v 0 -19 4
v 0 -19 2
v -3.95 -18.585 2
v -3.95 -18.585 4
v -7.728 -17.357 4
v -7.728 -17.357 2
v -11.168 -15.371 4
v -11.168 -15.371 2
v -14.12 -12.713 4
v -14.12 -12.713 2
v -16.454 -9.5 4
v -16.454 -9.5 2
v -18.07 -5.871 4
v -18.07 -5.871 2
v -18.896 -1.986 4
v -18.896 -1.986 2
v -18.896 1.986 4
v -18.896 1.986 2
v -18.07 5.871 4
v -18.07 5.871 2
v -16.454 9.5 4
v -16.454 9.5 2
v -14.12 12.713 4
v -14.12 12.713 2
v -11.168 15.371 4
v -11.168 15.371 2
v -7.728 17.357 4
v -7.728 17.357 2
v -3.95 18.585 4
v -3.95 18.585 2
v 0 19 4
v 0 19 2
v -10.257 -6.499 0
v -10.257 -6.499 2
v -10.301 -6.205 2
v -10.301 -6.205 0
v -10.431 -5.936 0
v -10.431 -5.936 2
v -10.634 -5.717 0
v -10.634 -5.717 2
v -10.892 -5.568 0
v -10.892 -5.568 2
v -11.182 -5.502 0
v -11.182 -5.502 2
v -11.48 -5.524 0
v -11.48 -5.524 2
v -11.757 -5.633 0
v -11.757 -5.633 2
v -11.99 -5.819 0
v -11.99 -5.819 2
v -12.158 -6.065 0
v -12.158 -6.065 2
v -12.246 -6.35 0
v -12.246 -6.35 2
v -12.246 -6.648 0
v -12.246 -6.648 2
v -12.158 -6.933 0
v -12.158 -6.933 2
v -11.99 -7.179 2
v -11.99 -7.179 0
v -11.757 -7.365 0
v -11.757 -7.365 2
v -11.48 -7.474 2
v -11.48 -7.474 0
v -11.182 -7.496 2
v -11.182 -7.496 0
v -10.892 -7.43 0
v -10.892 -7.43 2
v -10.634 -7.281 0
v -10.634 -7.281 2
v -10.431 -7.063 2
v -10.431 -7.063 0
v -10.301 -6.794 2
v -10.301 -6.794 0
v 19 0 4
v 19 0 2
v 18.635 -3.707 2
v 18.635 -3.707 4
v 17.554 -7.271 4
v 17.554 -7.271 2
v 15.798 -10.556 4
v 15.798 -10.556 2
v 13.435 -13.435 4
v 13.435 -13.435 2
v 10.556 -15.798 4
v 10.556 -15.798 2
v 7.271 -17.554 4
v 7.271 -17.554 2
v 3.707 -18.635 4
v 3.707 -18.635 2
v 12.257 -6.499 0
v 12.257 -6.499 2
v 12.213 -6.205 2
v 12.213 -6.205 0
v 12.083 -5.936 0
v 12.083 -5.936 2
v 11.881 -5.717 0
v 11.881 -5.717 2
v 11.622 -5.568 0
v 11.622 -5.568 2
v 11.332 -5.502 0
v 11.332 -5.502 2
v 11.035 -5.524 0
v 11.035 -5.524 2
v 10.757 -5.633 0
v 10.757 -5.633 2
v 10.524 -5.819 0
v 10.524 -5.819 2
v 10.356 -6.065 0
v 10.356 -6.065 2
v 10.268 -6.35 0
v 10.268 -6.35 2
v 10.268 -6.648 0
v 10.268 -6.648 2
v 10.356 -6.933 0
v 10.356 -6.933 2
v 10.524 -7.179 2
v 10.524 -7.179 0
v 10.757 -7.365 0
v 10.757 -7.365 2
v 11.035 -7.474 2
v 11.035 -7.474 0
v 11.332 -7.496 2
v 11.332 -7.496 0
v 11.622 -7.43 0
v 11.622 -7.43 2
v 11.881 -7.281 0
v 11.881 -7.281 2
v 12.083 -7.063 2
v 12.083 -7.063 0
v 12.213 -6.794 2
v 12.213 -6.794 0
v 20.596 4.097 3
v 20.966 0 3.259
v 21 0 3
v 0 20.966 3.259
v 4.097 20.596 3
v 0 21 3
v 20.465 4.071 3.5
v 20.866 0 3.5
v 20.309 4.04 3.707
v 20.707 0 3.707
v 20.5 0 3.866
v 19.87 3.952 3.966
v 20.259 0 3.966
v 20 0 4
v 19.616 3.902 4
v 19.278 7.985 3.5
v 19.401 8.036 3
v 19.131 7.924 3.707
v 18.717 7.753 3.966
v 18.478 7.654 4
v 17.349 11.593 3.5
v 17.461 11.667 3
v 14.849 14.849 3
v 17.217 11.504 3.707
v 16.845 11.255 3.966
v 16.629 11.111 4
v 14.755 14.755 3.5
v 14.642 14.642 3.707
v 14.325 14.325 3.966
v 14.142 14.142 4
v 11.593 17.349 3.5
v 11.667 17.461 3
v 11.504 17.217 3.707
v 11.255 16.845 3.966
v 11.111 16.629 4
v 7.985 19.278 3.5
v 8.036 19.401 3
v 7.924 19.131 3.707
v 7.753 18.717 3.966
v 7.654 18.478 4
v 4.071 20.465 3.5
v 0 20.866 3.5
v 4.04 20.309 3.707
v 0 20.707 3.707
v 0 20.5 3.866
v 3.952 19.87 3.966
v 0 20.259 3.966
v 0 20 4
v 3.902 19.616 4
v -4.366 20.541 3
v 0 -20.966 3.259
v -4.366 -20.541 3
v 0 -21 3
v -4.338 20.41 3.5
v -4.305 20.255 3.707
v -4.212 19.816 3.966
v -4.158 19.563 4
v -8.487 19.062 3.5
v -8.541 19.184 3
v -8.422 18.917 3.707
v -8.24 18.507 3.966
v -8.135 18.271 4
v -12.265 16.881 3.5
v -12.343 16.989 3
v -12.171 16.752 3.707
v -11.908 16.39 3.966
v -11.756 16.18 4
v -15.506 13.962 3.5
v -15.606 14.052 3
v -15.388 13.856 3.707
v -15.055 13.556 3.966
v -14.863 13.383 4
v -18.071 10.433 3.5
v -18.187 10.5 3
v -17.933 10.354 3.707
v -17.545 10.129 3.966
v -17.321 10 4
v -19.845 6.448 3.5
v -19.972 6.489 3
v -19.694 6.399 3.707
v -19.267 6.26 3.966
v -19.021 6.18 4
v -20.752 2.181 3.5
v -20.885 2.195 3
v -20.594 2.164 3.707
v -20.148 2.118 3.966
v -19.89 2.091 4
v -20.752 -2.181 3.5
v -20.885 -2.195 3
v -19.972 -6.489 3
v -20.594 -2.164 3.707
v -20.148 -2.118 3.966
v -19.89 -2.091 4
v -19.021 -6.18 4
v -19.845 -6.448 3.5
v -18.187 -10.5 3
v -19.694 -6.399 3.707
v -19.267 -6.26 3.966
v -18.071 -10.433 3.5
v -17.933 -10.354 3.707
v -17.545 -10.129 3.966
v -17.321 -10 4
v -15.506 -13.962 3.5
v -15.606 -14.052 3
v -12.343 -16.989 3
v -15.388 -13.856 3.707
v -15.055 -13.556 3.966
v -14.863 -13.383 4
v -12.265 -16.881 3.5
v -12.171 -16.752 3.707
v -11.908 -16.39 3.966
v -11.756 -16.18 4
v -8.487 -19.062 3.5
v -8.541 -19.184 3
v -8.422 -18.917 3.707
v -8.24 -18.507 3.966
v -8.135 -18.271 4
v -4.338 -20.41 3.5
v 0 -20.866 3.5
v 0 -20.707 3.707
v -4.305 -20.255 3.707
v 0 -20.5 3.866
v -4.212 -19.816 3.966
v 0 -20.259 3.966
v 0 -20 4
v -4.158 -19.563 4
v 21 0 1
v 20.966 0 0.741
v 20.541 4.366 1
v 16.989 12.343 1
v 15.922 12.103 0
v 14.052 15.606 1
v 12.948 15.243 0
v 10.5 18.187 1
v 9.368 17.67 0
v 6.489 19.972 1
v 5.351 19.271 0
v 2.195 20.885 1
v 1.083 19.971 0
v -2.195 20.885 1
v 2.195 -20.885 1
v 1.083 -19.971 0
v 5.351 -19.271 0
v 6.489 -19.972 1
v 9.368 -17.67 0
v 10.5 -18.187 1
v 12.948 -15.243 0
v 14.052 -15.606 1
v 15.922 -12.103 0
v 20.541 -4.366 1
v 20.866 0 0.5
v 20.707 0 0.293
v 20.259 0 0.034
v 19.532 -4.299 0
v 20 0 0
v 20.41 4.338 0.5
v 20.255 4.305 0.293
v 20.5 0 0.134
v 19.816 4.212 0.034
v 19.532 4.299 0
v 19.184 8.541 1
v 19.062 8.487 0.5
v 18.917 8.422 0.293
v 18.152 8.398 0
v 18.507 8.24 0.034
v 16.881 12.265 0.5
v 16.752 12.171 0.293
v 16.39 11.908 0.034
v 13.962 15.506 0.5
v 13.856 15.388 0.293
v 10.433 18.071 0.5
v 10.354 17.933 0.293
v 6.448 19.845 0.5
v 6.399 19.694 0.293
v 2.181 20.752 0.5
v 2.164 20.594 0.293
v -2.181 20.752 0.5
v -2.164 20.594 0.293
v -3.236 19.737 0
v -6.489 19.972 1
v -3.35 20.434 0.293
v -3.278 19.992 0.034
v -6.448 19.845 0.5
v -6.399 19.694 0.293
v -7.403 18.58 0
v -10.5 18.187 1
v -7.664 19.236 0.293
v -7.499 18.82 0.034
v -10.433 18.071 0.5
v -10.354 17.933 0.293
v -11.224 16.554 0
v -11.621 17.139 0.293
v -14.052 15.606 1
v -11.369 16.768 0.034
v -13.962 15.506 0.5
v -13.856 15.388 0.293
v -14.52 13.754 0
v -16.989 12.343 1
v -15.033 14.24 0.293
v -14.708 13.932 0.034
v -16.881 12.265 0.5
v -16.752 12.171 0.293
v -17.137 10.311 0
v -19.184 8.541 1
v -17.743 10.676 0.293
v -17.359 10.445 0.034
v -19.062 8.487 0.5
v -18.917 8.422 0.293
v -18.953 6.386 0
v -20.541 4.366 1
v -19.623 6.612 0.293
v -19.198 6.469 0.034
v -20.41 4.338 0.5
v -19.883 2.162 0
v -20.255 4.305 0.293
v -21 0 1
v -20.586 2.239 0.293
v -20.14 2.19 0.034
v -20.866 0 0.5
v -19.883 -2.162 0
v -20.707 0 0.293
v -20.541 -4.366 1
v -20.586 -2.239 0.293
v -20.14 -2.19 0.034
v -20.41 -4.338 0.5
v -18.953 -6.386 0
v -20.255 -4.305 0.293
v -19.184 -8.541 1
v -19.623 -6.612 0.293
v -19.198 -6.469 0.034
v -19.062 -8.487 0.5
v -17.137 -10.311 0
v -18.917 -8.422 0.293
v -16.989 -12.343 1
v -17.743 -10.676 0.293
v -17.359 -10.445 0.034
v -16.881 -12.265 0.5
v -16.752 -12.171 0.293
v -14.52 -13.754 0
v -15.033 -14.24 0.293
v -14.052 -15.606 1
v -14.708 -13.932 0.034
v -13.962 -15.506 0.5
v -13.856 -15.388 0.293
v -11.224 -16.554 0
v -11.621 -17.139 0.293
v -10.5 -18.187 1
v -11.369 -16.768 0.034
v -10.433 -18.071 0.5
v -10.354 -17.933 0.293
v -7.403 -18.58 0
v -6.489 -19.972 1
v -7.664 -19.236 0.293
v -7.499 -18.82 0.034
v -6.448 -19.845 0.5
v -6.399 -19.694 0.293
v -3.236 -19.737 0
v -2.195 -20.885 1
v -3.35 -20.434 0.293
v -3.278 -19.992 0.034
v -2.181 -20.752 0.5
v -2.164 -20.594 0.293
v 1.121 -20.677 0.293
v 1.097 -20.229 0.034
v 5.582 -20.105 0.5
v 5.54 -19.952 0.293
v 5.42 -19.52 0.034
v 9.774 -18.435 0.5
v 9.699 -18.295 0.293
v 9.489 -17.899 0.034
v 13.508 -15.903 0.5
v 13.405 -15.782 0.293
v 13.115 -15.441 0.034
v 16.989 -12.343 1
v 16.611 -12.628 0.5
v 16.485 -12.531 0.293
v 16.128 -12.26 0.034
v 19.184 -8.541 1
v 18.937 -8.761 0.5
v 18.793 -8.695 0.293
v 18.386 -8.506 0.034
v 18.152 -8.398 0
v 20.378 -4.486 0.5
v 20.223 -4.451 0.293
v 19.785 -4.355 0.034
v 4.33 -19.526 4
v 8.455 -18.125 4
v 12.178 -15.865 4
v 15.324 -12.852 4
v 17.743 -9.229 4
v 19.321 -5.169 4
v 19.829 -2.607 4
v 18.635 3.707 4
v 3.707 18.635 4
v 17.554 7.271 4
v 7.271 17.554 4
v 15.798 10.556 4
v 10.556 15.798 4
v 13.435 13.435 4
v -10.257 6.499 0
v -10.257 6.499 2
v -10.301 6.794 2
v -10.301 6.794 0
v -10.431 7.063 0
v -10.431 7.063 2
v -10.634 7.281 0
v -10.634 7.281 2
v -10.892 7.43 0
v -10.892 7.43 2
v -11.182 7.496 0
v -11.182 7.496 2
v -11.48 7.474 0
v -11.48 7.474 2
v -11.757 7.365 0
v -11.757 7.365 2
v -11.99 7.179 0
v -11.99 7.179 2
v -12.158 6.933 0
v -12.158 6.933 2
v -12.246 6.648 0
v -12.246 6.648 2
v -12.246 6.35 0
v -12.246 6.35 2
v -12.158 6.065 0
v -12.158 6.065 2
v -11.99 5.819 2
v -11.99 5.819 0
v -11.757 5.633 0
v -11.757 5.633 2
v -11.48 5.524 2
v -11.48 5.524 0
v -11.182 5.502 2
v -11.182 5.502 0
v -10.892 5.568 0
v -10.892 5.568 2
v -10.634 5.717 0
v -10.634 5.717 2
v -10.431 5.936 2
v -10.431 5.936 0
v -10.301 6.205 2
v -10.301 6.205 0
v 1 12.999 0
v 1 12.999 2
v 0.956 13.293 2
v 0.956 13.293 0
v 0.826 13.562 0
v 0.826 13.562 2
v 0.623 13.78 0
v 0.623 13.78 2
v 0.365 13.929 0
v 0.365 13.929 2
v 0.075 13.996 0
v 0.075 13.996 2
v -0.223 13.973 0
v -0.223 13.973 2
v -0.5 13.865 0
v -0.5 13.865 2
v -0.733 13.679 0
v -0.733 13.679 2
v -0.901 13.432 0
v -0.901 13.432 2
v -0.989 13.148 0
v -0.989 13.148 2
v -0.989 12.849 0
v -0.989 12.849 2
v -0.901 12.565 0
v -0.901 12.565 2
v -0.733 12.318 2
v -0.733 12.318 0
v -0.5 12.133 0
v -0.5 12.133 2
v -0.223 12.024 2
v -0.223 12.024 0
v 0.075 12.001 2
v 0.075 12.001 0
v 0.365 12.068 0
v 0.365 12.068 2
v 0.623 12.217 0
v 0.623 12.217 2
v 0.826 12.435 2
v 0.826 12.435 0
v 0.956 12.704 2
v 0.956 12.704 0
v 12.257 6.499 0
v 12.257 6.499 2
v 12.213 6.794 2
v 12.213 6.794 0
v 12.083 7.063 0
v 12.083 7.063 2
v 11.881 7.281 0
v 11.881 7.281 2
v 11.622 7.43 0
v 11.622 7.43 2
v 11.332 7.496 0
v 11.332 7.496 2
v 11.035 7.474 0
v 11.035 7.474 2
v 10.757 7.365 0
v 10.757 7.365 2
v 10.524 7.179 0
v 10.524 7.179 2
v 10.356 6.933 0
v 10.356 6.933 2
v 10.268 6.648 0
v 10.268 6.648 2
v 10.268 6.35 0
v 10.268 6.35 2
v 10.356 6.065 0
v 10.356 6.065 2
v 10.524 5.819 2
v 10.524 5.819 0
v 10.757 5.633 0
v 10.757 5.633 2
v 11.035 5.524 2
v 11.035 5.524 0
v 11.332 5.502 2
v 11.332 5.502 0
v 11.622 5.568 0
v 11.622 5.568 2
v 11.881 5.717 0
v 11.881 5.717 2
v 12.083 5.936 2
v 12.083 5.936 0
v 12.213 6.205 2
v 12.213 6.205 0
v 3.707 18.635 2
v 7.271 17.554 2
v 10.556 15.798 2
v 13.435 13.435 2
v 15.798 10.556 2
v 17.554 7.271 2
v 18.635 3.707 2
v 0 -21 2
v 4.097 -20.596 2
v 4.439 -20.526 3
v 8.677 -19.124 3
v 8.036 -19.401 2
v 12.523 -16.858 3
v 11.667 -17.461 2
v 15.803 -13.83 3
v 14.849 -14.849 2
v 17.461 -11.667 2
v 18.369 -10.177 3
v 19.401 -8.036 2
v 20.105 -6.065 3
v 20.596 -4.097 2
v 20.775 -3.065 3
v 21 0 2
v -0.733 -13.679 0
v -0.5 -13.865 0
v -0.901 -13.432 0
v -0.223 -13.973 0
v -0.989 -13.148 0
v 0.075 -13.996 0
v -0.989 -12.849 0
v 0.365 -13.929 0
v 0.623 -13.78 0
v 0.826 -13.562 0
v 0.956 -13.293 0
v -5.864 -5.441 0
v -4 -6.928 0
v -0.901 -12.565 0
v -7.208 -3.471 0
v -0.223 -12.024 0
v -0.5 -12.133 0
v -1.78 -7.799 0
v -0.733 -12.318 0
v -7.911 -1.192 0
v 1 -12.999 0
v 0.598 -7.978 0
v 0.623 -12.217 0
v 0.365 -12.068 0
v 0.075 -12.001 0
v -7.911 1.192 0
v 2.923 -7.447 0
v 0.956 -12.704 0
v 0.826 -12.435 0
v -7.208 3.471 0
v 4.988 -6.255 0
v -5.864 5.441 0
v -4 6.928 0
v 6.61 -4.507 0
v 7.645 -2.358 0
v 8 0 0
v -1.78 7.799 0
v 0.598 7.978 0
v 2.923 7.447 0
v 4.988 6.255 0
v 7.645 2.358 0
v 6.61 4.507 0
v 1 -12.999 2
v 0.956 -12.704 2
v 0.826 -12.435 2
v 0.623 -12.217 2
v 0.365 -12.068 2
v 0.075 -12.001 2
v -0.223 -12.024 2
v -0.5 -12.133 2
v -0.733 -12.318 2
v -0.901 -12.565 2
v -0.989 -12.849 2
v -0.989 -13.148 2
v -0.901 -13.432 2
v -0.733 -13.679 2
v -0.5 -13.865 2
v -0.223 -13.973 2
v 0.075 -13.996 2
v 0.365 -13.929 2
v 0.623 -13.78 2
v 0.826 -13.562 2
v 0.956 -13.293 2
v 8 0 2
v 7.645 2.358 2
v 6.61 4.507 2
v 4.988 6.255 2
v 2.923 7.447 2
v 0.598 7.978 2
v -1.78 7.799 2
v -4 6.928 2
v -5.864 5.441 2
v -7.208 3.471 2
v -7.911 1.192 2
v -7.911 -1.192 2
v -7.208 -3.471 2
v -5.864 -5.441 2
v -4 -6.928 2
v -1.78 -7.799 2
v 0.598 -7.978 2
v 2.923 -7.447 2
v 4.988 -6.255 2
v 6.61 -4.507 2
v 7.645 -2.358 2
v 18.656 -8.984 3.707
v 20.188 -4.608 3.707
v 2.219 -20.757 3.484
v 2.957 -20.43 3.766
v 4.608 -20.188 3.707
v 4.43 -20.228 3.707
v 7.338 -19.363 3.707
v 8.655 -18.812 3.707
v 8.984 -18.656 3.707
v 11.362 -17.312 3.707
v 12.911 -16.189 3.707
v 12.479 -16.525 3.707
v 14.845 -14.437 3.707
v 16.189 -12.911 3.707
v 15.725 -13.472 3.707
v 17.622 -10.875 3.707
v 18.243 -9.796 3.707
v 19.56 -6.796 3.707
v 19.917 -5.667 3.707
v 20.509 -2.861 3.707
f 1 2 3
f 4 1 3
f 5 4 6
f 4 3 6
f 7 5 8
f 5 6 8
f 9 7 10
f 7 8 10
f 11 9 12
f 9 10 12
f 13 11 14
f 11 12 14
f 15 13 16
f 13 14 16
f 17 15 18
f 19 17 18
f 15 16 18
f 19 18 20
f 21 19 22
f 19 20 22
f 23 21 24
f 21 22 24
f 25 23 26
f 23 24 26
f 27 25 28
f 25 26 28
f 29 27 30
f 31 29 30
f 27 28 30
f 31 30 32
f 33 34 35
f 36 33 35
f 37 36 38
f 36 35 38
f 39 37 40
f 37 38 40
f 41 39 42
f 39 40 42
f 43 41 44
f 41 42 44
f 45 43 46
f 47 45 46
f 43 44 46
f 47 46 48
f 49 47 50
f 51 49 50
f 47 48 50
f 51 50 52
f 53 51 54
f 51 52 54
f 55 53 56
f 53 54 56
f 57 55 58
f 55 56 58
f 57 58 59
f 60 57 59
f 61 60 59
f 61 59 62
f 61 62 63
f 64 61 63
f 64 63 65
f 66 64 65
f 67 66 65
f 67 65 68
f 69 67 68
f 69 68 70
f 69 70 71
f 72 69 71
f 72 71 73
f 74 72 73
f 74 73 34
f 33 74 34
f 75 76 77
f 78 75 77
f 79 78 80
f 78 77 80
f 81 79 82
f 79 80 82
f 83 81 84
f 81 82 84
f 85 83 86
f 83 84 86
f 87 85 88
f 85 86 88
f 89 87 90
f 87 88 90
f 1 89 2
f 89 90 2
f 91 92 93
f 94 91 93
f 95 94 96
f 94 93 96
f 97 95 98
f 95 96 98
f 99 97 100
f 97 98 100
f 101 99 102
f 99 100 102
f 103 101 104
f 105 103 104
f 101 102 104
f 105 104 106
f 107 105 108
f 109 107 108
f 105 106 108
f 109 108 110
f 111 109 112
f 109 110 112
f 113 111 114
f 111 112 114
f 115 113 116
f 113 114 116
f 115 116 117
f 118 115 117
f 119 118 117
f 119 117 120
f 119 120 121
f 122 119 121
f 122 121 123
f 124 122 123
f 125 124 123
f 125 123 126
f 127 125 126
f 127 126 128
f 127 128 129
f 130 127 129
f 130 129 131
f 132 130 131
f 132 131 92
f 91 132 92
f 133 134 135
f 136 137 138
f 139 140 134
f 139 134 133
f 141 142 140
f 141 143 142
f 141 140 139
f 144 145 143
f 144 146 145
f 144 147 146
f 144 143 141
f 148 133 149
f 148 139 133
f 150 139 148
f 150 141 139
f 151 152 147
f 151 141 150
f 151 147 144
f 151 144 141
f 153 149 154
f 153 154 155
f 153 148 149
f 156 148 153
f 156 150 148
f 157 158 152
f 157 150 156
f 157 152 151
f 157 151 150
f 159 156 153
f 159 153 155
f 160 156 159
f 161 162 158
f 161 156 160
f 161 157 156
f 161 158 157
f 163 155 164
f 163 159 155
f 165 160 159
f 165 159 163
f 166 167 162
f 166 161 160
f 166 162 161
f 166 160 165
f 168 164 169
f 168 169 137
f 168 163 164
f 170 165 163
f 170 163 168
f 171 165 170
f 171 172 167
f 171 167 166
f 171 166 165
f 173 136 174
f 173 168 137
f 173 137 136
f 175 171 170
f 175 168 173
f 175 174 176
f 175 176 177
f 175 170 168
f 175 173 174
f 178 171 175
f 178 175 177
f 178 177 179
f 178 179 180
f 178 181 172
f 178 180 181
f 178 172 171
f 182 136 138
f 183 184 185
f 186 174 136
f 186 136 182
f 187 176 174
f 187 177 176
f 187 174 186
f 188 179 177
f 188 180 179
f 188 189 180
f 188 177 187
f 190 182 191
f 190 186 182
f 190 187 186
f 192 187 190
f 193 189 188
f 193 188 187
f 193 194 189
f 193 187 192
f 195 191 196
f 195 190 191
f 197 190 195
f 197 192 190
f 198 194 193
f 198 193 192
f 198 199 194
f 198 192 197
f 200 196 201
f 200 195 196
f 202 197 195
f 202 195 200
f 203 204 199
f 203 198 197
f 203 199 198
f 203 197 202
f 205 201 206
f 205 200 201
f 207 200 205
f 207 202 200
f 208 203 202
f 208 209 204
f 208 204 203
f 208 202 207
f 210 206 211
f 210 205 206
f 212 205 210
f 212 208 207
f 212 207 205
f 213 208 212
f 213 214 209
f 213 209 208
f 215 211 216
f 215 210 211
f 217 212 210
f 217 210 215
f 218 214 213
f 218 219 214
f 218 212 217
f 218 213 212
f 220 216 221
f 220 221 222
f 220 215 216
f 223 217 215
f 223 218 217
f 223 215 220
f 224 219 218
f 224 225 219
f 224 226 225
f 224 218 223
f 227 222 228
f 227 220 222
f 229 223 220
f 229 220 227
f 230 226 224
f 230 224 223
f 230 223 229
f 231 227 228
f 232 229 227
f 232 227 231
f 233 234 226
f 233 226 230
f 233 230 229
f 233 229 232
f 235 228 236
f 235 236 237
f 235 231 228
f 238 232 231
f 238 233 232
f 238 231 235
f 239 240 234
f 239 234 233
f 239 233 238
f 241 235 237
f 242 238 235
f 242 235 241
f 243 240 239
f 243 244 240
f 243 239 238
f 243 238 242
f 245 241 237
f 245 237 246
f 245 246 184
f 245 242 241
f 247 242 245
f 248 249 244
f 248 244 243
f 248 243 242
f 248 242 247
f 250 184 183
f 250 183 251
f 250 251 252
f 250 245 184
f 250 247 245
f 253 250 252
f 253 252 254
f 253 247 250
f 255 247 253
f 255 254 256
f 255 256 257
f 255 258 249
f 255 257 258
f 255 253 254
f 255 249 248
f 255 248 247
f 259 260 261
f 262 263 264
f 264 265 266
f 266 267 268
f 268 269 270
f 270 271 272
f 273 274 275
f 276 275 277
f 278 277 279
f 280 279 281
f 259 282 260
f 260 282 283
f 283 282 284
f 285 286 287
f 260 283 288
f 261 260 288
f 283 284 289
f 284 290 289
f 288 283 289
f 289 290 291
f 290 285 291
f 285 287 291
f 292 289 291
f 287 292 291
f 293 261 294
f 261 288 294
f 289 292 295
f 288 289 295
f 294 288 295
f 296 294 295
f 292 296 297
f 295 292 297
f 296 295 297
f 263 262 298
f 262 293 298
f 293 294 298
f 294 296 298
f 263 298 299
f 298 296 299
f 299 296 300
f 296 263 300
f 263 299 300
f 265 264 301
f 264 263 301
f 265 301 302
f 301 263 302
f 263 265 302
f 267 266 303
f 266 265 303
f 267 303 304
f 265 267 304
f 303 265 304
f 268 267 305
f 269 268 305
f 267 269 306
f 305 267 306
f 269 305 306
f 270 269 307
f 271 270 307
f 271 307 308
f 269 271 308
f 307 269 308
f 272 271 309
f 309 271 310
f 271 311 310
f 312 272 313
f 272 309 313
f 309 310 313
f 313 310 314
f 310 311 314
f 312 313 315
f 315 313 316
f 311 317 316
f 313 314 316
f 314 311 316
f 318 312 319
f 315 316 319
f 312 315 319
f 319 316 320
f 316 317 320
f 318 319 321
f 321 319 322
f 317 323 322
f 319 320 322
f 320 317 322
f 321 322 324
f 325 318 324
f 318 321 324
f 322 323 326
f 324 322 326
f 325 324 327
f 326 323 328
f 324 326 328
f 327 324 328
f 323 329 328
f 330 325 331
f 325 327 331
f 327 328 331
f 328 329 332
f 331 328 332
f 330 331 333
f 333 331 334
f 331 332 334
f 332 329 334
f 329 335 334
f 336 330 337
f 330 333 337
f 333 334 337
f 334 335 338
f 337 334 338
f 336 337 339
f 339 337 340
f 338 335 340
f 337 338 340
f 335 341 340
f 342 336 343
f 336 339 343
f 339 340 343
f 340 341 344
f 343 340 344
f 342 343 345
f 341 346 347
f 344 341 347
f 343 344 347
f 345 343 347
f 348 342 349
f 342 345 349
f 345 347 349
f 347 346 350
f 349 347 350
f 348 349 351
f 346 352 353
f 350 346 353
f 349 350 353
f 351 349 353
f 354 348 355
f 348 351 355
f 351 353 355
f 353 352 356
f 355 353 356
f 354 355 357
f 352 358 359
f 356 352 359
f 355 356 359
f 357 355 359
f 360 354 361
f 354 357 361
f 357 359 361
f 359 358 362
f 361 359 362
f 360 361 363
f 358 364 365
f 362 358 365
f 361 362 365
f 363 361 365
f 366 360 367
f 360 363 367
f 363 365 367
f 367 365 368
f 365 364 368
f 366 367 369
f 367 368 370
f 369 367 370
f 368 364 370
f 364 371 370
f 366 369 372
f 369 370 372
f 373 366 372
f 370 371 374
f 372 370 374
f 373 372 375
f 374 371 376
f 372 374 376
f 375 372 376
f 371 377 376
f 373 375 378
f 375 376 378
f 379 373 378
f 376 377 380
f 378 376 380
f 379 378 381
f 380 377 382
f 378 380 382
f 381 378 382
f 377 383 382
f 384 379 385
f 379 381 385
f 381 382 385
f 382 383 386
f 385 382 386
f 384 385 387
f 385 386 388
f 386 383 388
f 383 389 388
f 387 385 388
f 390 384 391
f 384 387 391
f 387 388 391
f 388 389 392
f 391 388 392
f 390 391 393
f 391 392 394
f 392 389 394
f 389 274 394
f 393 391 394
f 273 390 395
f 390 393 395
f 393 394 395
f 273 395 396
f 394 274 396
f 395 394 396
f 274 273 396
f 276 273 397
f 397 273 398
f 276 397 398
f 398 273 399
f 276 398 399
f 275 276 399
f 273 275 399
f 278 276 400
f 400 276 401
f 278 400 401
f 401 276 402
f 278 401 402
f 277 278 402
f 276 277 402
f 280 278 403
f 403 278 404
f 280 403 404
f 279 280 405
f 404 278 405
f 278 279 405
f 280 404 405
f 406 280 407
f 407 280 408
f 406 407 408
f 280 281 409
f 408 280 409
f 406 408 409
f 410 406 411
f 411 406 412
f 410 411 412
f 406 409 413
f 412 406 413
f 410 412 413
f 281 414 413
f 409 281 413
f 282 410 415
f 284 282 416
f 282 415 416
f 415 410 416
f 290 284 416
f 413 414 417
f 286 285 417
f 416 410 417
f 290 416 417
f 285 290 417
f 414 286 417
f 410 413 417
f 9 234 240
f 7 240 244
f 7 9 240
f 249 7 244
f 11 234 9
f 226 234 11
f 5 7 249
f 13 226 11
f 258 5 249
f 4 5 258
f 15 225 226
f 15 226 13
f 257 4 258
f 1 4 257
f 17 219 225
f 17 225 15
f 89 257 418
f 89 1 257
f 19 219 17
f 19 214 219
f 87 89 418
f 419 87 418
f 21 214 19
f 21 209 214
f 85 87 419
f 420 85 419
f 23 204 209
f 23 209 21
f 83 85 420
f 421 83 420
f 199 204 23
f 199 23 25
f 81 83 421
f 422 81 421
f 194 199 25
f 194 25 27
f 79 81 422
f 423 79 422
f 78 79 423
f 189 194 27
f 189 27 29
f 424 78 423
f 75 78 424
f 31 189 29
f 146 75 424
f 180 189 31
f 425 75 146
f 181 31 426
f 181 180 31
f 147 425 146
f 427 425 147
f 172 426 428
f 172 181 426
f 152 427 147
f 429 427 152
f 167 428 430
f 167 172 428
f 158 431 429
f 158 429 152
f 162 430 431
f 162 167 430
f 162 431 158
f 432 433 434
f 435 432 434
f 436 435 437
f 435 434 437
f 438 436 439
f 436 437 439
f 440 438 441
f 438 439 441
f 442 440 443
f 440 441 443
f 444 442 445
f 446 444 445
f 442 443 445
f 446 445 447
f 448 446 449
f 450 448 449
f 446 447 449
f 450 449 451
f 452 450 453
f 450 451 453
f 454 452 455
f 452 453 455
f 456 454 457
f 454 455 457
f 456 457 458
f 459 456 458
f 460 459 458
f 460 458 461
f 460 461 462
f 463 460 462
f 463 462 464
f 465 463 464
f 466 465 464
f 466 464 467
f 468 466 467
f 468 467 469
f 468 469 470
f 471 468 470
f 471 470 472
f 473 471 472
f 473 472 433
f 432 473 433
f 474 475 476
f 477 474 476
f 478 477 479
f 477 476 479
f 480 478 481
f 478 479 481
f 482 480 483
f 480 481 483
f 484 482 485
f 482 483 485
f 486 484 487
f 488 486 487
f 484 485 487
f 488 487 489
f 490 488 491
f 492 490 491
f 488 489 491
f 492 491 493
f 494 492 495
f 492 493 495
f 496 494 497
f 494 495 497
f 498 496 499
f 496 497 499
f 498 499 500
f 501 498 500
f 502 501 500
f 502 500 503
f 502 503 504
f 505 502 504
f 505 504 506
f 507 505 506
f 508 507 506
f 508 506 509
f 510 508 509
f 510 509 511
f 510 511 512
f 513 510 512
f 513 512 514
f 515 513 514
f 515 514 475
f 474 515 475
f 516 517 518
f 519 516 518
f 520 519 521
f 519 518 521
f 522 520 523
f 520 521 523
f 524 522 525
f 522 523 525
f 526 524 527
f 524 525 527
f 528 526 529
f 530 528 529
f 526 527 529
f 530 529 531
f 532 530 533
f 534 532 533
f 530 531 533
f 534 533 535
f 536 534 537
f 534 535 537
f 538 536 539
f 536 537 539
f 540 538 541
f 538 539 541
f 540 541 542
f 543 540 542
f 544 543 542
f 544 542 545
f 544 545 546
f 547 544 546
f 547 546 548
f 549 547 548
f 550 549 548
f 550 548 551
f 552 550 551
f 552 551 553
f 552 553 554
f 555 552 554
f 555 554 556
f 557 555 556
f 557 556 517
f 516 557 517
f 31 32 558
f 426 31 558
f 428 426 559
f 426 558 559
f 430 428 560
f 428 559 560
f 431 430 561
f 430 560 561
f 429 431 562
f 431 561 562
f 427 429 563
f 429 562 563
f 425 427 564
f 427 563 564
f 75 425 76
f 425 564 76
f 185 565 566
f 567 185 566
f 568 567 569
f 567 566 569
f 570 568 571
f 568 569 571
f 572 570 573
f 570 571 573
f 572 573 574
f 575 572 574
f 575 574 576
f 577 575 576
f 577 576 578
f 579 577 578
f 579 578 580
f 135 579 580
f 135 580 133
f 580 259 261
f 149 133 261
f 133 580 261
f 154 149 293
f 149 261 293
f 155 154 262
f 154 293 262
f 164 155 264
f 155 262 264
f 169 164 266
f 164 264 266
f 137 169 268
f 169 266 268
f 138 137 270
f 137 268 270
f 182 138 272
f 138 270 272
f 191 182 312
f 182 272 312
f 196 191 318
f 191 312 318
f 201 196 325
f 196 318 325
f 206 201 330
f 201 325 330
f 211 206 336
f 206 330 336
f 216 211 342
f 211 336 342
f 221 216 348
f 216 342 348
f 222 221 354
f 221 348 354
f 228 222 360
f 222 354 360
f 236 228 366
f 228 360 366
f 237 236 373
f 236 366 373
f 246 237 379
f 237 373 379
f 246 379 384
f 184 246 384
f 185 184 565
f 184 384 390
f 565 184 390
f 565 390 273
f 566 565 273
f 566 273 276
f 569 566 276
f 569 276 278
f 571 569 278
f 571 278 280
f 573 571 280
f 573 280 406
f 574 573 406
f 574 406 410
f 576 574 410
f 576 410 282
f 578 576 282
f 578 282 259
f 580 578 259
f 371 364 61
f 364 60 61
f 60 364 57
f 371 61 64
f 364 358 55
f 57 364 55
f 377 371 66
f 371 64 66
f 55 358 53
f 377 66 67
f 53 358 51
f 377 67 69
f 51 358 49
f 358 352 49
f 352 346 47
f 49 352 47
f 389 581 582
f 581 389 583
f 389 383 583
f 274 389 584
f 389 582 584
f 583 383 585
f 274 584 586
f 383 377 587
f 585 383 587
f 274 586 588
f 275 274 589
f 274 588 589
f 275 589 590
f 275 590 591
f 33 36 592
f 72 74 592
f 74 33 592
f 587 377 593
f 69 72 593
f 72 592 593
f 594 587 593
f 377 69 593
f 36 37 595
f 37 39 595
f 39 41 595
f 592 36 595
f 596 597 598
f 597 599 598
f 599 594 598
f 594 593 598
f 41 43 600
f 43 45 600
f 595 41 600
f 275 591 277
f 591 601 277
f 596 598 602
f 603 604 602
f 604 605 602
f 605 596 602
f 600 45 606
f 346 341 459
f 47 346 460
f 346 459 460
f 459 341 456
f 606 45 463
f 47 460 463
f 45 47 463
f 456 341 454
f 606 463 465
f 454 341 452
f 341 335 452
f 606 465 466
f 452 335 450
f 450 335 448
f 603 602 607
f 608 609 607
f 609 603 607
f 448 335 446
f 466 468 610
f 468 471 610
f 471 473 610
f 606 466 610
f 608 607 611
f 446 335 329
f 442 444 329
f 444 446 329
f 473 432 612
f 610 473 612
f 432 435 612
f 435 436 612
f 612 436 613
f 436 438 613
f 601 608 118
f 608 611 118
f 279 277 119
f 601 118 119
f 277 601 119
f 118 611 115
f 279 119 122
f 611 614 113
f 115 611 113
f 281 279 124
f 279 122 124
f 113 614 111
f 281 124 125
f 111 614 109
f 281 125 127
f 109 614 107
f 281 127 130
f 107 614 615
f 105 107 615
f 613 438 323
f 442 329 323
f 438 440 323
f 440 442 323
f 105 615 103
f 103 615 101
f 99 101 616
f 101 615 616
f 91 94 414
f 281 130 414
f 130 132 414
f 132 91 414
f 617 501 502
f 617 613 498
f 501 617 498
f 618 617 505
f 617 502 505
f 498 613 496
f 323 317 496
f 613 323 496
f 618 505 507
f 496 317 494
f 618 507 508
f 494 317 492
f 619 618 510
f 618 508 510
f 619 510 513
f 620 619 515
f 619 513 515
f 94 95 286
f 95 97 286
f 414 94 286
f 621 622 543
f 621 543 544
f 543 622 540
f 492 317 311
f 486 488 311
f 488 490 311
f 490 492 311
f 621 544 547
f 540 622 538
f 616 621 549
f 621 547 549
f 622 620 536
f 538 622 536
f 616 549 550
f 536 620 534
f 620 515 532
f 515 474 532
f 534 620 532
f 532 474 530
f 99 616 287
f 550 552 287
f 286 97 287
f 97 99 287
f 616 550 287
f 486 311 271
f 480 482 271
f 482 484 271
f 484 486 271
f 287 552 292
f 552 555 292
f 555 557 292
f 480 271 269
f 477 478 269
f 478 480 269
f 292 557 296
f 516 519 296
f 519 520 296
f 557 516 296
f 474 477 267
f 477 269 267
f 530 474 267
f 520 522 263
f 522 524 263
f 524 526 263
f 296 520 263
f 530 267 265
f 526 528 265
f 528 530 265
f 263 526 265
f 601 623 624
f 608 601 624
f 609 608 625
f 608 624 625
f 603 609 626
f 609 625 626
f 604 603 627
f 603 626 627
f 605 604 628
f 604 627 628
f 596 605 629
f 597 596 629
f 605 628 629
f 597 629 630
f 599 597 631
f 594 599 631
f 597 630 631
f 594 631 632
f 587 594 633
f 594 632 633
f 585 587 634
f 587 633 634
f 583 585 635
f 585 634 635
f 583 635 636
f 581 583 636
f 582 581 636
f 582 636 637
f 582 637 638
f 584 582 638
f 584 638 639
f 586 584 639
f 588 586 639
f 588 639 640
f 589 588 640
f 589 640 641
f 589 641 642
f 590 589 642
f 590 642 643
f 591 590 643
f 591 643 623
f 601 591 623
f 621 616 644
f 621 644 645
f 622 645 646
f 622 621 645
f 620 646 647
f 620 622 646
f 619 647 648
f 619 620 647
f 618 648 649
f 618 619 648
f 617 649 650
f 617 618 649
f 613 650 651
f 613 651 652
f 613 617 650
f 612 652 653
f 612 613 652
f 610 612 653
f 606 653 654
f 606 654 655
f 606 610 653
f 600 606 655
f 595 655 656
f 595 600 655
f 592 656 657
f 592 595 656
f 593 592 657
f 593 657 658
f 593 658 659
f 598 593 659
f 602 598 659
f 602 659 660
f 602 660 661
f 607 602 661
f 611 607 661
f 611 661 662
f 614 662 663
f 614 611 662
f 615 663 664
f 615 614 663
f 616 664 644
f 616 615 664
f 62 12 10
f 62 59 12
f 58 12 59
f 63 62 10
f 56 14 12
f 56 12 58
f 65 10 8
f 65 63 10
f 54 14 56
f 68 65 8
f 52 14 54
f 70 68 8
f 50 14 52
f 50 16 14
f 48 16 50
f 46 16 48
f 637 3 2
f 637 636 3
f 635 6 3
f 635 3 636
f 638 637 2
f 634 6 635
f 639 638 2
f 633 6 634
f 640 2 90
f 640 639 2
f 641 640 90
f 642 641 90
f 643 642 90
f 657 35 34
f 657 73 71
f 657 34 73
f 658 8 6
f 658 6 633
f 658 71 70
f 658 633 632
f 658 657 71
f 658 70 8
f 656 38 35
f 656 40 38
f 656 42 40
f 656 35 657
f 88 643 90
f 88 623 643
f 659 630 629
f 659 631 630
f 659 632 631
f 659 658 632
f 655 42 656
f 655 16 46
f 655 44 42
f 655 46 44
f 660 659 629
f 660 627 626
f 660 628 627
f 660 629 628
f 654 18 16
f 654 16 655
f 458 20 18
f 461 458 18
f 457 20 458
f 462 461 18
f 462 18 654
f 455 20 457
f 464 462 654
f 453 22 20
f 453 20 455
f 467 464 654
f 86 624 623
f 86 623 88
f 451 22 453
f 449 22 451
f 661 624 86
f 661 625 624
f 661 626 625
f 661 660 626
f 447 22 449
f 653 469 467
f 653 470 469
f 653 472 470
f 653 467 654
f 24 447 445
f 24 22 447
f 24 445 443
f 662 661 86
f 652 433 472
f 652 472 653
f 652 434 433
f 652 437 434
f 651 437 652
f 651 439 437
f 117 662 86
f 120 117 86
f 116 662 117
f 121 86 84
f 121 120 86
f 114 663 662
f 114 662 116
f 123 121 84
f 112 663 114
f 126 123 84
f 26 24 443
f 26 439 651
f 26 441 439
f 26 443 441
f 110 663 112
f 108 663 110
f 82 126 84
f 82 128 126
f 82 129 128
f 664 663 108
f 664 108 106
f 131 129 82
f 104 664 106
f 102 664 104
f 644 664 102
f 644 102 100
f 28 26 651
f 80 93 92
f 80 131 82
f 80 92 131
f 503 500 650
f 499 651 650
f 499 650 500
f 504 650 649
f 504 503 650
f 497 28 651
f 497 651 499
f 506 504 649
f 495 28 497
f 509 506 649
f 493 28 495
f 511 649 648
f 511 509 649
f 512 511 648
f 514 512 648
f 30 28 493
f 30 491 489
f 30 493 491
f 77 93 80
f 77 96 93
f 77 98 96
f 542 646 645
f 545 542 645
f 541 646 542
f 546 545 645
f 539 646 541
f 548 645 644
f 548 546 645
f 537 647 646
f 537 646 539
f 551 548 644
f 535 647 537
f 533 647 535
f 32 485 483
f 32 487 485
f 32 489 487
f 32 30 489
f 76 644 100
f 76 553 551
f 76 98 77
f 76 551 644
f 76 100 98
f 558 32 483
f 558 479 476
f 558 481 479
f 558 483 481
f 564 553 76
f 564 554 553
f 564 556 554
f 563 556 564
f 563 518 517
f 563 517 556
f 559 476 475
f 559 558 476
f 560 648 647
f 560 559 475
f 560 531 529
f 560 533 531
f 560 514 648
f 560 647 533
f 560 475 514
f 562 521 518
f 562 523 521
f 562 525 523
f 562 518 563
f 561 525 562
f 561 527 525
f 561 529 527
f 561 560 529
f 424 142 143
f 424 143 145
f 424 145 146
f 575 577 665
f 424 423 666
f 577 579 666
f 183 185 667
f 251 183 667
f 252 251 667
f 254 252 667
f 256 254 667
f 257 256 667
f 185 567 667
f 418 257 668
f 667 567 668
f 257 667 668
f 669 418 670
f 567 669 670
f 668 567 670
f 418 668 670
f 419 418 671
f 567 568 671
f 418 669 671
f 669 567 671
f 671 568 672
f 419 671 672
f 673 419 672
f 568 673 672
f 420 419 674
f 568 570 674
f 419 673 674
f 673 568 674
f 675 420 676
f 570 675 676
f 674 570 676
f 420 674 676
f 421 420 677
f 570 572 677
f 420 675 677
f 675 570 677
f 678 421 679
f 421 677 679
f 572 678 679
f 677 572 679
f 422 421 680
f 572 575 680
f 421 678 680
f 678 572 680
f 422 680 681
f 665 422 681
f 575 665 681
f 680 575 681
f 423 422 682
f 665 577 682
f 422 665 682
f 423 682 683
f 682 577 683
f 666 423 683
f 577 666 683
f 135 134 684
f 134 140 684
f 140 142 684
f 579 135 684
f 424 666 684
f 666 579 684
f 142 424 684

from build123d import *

# Parameters (mm, degrees)
SKETCH_1_R          = 21
SKETCH_1_R_2        = 8
EXTRUDE_1_DEPTH     = 2
EXTRUDE_3_DEPTH     = 4
FILLET_1_R          = 1
SKETCH_3_R          = 1
CUT_EXTRUDE_2_DEPTH = 3


with BuildPart() as part:
    # Эскиз1 → Бобышка-Вытянуть1 (new body)
    with BuildSketch(Plane.XY):
        Circle(SKETCH_1_R)
        Circle(SKETCH_1_R_2, mode=Mode.SUBTRACT)
    extrude(amount=EXTRUDE_1_DEPTH)

    # Эскиз1<5> → Бобышка-Вытянуть3 (add)
    with BuildSketch(Plane.XY):
        with BuildLine():
            ThreePointArc((0, -19), (-19, 0), (0, 19))
            Line((0, 19), (0, 21))
            ThreePointArc((0, 21), (-21, 0), (0, -21))
            Line((0, -21), (0, -19))
        make_face()
        with BuildLine():
            Line((0, 21), (0, 19))
            ThreePointArc((0, 19), (13.435028843, 13.435028843), (19, 0))
            ThreePointArc((19, 0), (13.435028843, -13.435028843), (0, -19))
            Line((0, -19), (0, -21))
            ThreePointArc((0, -21), (14.849242405, -14.849242405), (21, 0))
            ThreePointArc((21, 0), (14.849242405, 14.849242405), (0, 21))
        make_face()
    extrude(amount=EXTRUDE_3_DEPTH)

    # Скругление1
    fillet_1_edges = [part.edges().sort_by_distance(p)[0] for p in [
        (0, 21, 4),
        (-21, 0, 0),
    ]]
    fillet(fillet_1_edges, radius=FILLET_1_R)

    # Эскиз3 → Вырез-Вытянуть2 (cut, through all)
    with BuildSketch(Plane.XY.offset(2)):
        with Locations((11.257055761, 6.499264174)):
            Circle(SKETCH_3_R)
        with Locations((11.257055761, -6.499264174)):
            Circle(SKETCH_3_R)
        with Locations((0, -12.998528347)):
            Circle(SKETCH_3_R)
        with Locations((-11.257055761, -6.499264174)):
            Circle(SKETCH_3_R)
        with Locations((0, 12.998528347)):
            Circle(SKETCH_3_R)
        with Locations((-11.257055761, 6.499264174)):
            Circle(SKETCH_3_R)
    extrude(amount=-CUT_EXTRUDE_2_DEPTH, mode=Mode.SUBTRACT)


solid = part.part
